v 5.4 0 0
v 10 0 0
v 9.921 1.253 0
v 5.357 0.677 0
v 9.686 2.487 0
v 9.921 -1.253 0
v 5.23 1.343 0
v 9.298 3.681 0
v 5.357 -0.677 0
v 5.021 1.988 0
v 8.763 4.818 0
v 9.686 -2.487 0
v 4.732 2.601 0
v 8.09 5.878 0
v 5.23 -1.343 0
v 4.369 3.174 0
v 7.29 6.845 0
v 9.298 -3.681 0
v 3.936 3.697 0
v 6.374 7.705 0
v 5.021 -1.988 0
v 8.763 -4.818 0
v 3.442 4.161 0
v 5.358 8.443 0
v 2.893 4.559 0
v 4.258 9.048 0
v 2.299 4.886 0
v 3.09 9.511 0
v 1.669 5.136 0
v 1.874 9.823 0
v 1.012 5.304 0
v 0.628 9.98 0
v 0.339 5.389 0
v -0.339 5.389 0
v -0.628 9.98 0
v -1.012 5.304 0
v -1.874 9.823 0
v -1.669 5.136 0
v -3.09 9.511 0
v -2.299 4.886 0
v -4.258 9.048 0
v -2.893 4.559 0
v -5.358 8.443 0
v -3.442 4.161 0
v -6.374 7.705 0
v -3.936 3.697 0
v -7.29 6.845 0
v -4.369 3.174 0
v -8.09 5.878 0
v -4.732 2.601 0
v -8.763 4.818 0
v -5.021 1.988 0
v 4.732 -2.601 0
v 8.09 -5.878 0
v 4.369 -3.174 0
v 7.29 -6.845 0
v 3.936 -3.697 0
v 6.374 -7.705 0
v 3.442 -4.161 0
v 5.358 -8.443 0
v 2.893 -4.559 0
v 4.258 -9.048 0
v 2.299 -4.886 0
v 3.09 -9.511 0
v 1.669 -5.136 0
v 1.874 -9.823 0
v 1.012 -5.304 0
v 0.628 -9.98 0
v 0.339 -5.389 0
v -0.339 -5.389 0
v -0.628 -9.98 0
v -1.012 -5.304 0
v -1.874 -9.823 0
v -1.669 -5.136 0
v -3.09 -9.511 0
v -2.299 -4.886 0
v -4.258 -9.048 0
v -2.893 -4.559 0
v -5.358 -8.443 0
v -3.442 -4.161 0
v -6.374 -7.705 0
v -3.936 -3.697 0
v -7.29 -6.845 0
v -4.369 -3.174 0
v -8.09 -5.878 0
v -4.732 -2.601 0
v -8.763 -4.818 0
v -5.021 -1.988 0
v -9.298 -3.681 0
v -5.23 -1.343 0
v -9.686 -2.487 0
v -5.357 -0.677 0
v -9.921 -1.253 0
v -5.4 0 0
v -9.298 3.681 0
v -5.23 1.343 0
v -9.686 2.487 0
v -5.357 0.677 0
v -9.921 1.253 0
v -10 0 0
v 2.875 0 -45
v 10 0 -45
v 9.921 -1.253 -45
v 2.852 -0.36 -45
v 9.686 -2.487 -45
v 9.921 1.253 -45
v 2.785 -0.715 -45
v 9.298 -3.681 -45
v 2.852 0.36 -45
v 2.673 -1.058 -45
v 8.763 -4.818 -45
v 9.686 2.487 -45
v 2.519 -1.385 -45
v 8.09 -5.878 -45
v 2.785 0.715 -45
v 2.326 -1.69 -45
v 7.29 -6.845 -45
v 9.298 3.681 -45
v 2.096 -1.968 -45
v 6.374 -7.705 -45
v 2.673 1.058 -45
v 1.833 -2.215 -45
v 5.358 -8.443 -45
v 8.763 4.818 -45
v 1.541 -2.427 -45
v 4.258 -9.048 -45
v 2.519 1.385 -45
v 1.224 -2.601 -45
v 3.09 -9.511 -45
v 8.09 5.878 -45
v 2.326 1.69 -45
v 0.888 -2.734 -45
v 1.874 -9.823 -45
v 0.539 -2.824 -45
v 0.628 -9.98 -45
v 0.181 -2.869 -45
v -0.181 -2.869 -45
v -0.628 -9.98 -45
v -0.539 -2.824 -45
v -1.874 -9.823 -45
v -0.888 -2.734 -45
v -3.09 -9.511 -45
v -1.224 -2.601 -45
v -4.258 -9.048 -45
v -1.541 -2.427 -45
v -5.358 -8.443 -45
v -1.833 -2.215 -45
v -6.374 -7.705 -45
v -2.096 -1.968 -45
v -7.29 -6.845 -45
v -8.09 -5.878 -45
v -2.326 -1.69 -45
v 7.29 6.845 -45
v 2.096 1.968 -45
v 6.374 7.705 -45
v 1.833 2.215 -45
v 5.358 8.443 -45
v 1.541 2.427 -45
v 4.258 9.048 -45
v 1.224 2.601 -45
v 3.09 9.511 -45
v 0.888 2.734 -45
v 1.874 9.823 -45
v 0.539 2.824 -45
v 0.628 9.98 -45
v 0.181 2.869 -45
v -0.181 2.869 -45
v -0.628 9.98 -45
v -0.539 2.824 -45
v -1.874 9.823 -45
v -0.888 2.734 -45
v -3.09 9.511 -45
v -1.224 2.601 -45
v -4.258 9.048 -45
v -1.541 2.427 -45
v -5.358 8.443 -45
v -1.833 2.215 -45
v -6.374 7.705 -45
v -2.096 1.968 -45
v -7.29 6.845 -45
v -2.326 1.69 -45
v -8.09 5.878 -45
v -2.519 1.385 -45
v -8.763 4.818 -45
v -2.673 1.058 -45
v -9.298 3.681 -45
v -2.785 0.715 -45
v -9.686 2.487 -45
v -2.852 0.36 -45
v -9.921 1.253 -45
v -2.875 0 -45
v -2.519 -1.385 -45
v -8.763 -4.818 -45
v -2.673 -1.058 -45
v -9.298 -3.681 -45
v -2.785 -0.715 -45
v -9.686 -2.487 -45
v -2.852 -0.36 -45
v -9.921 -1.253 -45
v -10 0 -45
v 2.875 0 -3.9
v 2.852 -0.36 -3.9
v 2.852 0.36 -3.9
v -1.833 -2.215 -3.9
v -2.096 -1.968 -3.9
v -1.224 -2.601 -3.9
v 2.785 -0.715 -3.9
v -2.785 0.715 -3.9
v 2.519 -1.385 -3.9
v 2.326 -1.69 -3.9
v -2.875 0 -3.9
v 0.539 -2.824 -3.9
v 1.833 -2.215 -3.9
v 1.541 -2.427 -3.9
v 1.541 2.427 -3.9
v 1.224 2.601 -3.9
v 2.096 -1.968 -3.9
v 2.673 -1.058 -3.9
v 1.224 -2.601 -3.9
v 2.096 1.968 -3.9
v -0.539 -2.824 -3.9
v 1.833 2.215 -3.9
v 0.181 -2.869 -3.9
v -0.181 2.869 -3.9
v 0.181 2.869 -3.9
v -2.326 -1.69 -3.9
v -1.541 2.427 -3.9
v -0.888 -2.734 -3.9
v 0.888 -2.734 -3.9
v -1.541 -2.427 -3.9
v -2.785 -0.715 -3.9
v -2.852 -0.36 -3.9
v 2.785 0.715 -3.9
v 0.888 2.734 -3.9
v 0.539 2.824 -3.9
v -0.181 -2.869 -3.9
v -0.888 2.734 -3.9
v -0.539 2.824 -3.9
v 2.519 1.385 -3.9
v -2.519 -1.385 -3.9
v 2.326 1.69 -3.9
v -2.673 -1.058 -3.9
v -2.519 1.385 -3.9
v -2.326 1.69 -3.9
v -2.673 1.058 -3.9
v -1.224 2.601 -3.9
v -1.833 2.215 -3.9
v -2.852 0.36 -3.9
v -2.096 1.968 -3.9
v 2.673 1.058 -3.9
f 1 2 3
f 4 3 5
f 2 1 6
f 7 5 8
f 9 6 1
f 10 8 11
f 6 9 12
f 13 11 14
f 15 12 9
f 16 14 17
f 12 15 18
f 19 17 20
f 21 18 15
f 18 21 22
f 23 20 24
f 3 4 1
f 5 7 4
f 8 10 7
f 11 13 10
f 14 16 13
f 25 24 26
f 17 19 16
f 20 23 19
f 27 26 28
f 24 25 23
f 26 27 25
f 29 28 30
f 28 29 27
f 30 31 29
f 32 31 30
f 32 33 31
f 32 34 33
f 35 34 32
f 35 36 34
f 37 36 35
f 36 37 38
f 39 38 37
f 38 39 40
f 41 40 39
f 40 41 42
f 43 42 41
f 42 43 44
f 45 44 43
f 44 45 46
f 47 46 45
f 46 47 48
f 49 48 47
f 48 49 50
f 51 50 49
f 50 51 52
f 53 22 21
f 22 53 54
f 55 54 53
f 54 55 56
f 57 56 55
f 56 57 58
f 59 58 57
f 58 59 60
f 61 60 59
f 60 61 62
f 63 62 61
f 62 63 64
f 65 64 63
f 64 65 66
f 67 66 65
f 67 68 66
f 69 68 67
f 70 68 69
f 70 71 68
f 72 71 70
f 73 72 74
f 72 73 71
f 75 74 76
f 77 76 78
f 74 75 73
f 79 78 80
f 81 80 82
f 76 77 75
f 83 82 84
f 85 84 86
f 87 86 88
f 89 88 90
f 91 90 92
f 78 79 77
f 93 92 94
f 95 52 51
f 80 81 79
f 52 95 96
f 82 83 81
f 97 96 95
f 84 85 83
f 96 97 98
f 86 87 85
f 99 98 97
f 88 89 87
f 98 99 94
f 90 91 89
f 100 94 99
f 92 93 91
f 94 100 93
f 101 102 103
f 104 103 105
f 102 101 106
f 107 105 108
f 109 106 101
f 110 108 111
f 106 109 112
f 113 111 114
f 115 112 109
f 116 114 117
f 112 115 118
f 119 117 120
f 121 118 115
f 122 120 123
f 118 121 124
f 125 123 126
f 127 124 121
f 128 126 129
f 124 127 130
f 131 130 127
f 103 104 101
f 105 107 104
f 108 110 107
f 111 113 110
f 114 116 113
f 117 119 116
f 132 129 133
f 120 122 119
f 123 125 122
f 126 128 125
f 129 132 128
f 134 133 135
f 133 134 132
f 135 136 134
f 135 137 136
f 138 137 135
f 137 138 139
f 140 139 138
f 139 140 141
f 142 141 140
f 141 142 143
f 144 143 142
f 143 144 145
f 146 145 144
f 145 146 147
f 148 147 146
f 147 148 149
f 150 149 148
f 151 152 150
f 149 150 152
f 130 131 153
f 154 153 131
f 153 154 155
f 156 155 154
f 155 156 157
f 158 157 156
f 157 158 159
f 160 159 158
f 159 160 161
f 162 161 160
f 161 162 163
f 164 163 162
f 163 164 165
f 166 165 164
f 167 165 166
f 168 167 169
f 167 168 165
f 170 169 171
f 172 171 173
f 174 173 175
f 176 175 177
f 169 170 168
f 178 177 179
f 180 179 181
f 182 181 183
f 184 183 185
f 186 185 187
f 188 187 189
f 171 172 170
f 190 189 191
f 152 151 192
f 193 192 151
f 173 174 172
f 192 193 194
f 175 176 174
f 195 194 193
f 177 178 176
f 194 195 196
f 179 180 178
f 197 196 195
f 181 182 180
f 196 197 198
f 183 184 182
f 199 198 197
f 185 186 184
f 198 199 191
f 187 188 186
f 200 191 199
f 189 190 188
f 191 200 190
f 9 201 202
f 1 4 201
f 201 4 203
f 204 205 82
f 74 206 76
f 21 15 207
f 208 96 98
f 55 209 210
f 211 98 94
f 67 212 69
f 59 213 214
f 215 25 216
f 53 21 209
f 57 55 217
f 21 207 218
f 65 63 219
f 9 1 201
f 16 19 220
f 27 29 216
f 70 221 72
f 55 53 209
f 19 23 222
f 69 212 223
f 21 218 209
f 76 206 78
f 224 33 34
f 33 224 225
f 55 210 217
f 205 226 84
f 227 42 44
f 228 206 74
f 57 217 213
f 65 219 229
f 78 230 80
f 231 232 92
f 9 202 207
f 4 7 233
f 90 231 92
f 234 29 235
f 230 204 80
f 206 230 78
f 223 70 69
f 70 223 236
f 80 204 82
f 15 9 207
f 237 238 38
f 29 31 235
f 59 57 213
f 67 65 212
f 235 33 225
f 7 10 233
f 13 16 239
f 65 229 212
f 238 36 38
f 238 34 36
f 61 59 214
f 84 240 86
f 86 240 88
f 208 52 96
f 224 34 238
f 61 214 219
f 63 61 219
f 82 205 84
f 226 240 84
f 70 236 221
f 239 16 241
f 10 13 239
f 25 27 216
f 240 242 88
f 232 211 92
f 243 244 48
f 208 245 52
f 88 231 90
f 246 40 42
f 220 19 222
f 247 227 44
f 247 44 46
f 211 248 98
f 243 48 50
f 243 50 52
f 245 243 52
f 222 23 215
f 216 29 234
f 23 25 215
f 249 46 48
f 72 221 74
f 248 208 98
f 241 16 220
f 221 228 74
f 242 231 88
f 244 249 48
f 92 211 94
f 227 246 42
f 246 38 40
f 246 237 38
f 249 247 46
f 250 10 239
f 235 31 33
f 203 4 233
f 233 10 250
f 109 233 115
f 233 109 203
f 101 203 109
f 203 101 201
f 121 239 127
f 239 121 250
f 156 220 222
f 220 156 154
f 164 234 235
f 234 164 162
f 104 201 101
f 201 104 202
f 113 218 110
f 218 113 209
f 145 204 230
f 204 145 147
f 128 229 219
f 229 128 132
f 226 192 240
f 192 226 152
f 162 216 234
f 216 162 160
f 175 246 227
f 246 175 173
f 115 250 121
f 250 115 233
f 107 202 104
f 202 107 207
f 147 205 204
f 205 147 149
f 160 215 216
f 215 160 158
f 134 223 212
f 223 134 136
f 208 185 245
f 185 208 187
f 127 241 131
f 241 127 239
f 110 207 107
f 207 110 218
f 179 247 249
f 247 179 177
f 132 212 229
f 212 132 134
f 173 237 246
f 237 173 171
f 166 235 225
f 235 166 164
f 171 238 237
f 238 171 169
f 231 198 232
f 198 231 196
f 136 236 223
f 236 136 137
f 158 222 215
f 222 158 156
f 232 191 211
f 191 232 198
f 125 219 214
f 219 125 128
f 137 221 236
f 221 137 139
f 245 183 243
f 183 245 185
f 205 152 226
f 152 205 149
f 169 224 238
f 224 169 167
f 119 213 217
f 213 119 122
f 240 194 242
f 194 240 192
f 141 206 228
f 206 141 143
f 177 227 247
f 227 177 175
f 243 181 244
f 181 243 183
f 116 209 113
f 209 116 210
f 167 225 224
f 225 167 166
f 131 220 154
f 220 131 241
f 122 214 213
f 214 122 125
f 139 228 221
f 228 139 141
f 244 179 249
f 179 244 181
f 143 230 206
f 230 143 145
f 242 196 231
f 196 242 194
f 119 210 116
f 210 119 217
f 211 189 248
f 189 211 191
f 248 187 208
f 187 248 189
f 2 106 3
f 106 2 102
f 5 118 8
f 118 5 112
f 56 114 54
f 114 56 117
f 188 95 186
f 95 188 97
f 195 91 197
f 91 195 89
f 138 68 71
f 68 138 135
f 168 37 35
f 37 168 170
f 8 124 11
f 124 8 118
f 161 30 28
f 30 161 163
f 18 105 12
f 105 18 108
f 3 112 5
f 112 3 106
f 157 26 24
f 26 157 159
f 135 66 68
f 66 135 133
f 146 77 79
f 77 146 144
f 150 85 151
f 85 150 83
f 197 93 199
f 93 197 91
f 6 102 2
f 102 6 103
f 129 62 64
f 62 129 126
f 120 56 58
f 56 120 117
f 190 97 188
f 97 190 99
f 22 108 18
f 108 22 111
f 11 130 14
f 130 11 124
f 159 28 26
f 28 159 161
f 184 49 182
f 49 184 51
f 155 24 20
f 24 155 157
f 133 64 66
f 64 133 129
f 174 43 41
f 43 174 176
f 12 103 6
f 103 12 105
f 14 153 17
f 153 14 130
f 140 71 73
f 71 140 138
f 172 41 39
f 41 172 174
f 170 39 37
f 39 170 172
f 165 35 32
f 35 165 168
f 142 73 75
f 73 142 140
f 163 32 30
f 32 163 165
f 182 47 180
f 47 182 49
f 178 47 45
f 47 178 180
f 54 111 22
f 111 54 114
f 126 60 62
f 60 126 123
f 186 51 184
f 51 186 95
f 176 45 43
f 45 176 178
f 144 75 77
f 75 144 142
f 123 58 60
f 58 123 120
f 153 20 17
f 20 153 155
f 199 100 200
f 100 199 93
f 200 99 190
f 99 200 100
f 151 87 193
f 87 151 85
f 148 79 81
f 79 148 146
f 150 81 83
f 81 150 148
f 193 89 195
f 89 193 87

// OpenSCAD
$fn = 50;


difference() {
	union() {
		translate(v = [0, 0, -45.0000000000]) {
			cylinder(h = 45, r = 10.0000000000);
		}
		cylinder(h = 0, r = 16.0000000000);
	}
	union() {
		translate(v = [0, 0, 0]) {
			rotate(a = [0, 0, 0]) {
				difference() {
					union() {
						#translate(v = [0, 0, -45.0000000000]) {
							cylinder(h = 45, r = 2.6000000000);
						}
						#translate(v = [0, 0, -3.9000000000]) {
							cylinder(h = 3.9000000000, r1 = 2.8750000000, r2 = 5.4000000000);
						}
						#translate(v = [0, 0, -45.0000000000]) {
							cylinder(h = 45, r = 2.8750000000);
						}
						#translate(v = [0, 0, -45.0000000000]) {
							cylinder(h = 45, r = 2.6000000000);
						}
					}
					union();
				}
			}
		}
	}
}
